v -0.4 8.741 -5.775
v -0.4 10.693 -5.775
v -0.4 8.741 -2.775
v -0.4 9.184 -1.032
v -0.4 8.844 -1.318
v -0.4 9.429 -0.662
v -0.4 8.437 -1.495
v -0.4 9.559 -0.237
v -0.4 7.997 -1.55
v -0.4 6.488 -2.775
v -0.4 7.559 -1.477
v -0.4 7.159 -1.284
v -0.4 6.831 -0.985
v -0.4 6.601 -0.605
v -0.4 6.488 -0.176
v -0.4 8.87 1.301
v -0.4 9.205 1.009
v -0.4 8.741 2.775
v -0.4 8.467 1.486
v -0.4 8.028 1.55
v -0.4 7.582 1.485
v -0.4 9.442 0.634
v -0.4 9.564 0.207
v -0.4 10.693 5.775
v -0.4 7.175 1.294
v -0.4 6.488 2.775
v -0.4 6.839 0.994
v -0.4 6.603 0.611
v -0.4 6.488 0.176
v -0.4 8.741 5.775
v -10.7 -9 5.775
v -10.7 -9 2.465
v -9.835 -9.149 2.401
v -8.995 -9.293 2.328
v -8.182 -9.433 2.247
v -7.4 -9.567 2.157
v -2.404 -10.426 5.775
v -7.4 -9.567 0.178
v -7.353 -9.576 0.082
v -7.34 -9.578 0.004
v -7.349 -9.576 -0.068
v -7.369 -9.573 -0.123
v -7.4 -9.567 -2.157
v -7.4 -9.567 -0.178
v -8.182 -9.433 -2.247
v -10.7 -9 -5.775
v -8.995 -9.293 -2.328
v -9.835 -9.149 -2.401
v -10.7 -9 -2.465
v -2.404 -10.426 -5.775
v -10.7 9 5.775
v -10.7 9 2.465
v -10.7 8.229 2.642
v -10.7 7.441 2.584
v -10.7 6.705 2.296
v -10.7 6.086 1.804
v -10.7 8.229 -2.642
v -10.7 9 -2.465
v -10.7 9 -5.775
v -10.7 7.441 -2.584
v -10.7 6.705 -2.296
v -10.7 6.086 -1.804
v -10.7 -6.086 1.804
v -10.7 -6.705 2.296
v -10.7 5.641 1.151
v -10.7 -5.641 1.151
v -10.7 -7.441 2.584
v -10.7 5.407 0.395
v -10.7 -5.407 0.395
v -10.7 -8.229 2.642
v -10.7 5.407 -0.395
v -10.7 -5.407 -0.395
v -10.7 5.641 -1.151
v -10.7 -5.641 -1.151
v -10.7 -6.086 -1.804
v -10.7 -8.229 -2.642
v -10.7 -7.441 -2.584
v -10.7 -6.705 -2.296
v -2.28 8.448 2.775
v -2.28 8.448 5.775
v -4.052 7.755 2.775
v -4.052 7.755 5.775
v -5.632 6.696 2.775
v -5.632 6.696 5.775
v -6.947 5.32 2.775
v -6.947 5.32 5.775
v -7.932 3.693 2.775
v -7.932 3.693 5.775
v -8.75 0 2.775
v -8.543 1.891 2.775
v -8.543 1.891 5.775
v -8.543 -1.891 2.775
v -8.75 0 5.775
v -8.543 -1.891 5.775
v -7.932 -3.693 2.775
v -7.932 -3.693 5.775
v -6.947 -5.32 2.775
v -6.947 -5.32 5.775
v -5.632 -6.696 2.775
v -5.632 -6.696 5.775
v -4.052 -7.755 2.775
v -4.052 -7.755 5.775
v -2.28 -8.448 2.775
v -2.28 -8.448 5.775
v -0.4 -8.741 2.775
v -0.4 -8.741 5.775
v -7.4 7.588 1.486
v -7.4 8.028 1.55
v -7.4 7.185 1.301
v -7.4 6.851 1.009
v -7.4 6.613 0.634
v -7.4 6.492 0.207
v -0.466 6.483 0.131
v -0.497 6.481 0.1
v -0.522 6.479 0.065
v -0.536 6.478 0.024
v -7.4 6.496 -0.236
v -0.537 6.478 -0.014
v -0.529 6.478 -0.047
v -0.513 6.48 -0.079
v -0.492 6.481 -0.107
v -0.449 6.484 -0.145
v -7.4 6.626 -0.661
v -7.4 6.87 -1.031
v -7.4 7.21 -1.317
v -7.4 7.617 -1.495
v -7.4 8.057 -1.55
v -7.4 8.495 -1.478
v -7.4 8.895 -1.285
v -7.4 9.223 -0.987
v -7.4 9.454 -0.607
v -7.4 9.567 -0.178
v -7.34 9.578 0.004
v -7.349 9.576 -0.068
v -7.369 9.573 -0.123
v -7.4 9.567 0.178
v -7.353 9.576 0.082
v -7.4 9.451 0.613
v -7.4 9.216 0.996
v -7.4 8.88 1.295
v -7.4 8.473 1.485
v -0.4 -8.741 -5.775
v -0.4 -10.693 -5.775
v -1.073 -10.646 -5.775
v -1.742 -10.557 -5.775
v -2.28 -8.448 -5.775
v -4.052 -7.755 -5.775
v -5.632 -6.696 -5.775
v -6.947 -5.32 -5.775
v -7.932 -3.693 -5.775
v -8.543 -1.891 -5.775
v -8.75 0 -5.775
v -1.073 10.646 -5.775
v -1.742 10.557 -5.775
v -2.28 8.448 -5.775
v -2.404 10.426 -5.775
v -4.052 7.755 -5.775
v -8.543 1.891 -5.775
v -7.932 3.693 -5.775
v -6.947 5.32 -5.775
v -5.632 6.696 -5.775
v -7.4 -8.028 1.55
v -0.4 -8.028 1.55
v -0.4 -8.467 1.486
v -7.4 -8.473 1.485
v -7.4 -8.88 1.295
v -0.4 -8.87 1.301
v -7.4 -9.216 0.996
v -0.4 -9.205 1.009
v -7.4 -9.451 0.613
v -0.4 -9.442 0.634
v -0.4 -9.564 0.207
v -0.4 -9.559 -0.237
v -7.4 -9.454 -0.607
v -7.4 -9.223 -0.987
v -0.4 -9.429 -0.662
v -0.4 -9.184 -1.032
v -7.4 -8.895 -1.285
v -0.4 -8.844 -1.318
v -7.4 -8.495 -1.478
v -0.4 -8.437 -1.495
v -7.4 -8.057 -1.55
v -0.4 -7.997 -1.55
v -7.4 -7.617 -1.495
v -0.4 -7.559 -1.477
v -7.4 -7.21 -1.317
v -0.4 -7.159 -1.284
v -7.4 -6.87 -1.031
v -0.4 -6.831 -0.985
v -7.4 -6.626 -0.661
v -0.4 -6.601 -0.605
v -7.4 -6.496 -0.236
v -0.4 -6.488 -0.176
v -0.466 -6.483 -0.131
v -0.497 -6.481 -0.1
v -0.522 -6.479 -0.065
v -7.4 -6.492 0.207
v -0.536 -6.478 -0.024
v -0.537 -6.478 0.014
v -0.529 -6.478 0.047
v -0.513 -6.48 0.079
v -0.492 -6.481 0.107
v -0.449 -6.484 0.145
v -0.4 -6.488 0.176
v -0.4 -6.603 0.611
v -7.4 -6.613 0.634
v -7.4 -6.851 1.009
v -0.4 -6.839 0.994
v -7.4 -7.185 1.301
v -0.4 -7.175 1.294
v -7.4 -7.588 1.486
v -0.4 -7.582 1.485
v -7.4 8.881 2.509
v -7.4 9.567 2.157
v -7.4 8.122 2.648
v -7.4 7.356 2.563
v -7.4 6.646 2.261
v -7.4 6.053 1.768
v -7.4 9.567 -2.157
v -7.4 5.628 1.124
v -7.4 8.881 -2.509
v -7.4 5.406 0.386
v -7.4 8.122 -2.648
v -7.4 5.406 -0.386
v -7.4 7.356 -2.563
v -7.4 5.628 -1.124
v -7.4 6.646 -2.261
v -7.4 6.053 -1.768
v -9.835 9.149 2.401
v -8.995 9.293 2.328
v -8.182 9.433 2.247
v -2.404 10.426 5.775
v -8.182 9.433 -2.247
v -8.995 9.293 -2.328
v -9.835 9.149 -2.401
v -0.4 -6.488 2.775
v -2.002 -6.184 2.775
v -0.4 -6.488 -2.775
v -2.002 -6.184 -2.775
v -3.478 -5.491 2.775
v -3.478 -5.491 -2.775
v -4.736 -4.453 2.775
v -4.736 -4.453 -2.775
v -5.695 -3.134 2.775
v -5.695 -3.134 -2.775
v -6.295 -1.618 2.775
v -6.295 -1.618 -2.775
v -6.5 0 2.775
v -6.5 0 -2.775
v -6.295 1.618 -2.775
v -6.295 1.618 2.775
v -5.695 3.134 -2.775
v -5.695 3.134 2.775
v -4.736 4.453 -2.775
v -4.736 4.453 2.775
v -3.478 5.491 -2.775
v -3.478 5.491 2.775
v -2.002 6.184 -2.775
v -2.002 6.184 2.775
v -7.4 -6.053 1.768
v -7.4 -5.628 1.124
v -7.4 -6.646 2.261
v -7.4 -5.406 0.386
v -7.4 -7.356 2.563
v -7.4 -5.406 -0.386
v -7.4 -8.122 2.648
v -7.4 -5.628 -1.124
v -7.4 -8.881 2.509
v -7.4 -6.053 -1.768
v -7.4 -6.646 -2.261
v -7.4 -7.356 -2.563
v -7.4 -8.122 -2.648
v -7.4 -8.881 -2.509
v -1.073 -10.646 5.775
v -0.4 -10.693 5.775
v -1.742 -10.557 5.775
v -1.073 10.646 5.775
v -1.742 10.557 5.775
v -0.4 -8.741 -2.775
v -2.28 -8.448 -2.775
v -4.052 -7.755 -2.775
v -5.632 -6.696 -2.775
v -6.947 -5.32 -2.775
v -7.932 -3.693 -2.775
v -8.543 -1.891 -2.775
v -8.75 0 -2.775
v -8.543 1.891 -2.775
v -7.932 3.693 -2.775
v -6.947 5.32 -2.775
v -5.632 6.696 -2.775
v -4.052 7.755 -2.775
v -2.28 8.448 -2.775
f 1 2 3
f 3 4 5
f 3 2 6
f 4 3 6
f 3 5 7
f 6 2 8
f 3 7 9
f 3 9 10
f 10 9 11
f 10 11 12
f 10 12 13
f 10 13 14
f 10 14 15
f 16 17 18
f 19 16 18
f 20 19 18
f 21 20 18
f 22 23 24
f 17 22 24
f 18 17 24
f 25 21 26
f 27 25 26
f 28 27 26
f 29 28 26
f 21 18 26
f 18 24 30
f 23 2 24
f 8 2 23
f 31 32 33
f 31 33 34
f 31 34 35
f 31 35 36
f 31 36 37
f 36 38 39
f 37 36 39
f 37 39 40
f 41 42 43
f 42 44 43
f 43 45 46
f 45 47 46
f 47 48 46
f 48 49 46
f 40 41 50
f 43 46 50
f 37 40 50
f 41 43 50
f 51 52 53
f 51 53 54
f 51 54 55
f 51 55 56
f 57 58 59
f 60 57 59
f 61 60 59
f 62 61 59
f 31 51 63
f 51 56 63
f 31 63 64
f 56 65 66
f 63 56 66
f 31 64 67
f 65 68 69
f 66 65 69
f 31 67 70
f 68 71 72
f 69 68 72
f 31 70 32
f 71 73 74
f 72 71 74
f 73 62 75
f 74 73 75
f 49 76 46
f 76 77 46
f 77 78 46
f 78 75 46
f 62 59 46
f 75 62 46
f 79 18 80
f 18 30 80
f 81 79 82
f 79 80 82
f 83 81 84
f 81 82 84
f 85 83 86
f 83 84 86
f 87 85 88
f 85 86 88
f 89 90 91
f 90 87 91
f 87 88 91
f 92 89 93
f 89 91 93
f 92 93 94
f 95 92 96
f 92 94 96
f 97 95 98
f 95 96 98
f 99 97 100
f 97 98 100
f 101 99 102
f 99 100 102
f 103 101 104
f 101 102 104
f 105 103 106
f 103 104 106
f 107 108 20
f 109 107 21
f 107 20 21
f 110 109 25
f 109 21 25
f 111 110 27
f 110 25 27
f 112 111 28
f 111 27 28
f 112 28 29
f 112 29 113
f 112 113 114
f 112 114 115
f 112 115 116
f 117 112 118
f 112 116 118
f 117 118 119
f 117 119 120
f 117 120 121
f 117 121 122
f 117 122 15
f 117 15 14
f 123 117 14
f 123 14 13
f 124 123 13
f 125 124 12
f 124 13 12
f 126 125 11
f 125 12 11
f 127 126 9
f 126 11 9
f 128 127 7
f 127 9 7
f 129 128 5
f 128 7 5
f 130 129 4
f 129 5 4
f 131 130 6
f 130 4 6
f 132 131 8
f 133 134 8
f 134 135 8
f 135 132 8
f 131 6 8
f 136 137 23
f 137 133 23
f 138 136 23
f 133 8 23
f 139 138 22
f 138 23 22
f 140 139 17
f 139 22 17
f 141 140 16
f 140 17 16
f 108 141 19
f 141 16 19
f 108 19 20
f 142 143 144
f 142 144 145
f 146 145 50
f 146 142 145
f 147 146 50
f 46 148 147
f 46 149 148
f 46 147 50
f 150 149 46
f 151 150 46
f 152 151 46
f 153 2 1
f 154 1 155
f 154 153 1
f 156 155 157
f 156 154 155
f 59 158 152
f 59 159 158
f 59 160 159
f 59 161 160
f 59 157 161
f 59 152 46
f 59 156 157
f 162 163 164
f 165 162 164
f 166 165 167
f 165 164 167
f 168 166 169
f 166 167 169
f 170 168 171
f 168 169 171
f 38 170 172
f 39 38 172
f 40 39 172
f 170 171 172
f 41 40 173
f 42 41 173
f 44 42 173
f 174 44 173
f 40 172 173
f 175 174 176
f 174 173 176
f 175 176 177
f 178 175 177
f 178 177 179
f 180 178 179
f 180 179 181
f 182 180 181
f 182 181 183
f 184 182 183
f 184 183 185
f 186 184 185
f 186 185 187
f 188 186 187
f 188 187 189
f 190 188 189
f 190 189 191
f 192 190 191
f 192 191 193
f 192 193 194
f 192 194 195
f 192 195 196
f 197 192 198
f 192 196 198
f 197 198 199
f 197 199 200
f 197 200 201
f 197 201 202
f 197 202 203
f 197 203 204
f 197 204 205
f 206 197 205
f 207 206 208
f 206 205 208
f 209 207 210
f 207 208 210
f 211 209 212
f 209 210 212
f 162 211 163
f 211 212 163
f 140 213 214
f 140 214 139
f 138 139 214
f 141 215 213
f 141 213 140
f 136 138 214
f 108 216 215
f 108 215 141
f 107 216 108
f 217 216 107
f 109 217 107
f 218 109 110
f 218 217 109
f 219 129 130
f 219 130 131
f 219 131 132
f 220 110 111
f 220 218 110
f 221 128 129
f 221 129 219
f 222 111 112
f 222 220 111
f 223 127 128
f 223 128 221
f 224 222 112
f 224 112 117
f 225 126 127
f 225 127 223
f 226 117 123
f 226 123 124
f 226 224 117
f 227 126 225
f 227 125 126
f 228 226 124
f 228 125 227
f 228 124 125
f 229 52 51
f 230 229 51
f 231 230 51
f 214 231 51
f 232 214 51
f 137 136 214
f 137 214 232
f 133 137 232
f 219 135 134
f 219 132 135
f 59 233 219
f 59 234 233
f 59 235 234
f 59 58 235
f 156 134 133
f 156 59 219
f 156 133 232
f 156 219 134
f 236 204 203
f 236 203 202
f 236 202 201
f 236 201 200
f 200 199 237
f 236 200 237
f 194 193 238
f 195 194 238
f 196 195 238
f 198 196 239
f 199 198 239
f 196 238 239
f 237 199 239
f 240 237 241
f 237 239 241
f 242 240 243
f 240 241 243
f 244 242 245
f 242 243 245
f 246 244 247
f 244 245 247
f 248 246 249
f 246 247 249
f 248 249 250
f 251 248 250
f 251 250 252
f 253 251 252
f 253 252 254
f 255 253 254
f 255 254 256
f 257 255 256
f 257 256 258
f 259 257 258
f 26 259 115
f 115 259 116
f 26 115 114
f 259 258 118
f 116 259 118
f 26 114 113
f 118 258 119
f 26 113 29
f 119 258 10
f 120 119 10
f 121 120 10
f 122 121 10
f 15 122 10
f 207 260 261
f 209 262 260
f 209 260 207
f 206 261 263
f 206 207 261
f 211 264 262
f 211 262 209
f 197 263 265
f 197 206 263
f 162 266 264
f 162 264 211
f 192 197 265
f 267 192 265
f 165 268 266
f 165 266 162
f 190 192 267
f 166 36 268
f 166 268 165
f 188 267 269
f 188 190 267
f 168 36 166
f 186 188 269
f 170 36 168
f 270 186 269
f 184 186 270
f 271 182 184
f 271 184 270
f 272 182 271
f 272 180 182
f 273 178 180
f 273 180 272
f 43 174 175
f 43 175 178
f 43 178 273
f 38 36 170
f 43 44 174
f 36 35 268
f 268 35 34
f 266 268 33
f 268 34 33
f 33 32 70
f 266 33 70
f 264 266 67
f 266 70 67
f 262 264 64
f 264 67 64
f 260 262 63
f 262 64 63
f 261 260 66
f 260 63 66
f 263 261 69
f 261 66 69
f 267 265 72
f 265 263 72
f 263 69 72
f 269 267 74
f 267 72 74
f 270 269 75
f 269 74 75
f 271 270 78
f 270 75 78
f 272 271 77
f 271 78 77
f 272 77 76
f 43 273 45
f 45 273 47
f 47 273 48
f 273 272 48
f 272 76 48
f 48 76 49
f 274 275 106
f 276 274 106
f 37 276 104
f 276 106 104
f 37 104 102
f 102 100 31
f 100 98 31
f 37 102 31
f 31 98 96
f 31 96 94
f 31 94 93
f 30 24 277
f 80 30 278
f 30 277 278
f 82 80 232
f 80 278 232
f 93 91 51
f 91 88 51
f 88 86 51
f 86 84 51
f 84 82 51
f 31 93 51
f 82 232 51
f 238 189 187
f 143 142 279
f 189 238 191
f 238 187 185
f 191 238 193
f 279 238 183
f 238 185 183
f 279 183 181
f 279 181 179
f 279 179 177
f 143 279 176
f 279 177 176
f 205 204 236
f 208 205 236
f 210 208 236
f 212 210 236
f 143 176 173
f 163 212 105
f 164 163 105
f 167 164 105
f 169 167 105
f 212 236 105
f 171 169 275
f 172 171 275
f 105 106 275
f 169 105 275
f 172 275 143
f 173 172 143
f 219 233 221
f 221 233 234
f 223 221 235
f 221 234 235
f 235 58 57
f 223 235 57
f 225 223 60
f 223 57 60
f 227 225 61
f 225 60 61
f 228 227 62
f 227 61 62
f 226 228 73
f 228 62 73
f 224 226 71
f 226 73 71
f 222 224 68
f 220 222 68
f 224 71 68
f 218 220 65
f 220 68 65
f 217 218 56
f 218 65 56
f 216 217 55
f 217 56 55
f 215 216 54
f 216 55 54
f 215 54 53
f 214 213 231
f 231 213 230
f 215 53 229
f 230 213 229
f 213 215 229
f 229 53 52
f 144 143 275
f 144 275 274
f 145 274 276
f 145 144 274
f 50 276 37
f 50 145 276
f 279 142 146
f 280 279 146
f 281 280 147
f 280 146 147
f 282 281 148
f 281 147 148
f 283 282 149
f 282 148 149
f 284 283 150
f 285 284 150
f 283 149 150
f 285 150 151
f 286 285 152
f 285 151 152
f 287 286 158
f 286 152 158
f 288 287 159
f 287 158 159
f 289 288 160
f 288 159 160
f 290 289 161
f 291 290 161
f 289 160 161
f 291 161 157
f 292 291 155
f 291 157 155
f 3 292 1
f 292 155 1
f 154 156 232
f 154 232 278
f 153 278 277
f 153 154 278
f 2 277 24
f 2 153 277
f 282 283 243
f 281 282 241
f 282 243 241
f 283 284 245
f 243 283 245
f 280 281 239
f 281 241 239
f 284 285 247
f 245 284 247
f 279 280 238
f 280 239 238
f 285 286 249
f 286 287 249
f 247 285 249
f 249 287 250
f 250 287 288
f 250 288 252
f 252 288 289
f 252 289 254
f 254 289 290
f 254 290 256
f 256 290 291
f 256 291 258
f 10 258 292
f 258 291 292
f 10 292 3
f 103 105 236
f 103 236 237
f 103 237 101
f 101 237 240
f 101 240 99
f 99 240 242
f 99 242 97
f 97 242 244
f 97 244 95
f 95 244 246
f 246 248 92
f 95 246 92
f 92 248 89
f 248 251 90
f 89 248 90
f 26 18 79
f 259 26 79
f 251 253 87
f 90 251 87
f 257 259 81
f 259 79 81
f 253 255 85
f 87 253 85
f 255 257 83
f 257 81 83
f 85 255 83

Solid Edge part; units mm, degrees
sketch "Sketch1" plane through (0, 0, 0) normal (0, 0, 1) x (1, 0, 0)
  line L0 (0, -6.5) -> (0, -10.7)
  arc A0 (0, -10.7) -> (-2.4041, -10.4264) centre (0, 0) cw
  line L1 (-10.7, -9) -> (-2.4041, -10.4264)
  line L2 (-10.7, 0) -> (-10.7, -9)
  line L3 (-10.7, 0) -> (-10.7, 9)
  line L4 (-10.7, 9) -> (-2.4041, 10.4264)
  line L5 (0, 10.7) -> (0, 6.5)
  arc A1 (-2.4041, 10.4264) -> (0, 10.7) centre (0, 0) cw
  arc A2 (0, -6.5) -> (0, 6.5) centre (0, 0) cw
extrude "Protrusion1" add sketch "Sketch1" along normal mid plane 11.55
sketch "Sketch2" plane through (-5.35, 0, 5.775) normal (0, 0, 1) x (0.9855377, -0.1694562, 0)
  arc A0 (6.7554, -7.7169) -> (3.7899, 9.53) centre (5.2726, 0.9066) cw
  line L0 (3.7899, 9.53) -> (4.1712, 7.3126)
  arc A1 (4.1712, 7.3126) -> (6.3741, -5.4994) centre (5.2726, 0.9066) ccw
  line L1 (6.3741, -5.4994) -> (6.7554, -7.7169)
extrude "ExtrudedCutout_1" cut sketch "Sketch2" against normal blind 3
mirror "Mirror1" about plane through (0, 0, 0) normal (0, 0, 1) of "ExtrudedCutout_1"
sketch "Sketch3" plane through (0, 0, 0) normal (0, 0, -1) x (-1, 0, 0)
  line L0 (0.4, 6.4877) -> (0, 6.4877)
  line L1 (0, 6.4877) -> (0, 10.7)
  line L2 (0, 10.7) -> (0.4, 10.7)
  line L3 (0.4, 10.7) -> (0.4, 6.4877)
extrude "ExtrudedCutout_2" cut sketch "Sketch3" along normal mid plane 12.1654
mirror "Mirror2" about plane through (0, 0, 0) normal (0, 1, 0) of "ExtrudedCutout_2"
sketch "Sketch4" plane through (-0.4, 8.5901, 0) normal (1, 0, 0) x (0, 0, 1)
  circle A0 centre (0, 0.5624) radius 1.55
  circle A1 centre (0, 16.6178) radius 1.55
  dimension "D1" = 3.1
  dimension "D2" = 1.54
extrude "ExtrudedCutout_3" cut sketch "Sketch4" along normal mid plane 184.4666
sketch "Sketch5" plane through (-10.7, 0, 0) normal (-1, 0, 0) x (0, 1, 0)
  circle A0 centre (-8.0277, 0) radius 2.65
  circle A1 centre (8.0277, 0) radius 2.65
extrude "ExtrudedCutout_4" cut sketch "Sketch5" against normal blind 3.3
properties material "PLA"
